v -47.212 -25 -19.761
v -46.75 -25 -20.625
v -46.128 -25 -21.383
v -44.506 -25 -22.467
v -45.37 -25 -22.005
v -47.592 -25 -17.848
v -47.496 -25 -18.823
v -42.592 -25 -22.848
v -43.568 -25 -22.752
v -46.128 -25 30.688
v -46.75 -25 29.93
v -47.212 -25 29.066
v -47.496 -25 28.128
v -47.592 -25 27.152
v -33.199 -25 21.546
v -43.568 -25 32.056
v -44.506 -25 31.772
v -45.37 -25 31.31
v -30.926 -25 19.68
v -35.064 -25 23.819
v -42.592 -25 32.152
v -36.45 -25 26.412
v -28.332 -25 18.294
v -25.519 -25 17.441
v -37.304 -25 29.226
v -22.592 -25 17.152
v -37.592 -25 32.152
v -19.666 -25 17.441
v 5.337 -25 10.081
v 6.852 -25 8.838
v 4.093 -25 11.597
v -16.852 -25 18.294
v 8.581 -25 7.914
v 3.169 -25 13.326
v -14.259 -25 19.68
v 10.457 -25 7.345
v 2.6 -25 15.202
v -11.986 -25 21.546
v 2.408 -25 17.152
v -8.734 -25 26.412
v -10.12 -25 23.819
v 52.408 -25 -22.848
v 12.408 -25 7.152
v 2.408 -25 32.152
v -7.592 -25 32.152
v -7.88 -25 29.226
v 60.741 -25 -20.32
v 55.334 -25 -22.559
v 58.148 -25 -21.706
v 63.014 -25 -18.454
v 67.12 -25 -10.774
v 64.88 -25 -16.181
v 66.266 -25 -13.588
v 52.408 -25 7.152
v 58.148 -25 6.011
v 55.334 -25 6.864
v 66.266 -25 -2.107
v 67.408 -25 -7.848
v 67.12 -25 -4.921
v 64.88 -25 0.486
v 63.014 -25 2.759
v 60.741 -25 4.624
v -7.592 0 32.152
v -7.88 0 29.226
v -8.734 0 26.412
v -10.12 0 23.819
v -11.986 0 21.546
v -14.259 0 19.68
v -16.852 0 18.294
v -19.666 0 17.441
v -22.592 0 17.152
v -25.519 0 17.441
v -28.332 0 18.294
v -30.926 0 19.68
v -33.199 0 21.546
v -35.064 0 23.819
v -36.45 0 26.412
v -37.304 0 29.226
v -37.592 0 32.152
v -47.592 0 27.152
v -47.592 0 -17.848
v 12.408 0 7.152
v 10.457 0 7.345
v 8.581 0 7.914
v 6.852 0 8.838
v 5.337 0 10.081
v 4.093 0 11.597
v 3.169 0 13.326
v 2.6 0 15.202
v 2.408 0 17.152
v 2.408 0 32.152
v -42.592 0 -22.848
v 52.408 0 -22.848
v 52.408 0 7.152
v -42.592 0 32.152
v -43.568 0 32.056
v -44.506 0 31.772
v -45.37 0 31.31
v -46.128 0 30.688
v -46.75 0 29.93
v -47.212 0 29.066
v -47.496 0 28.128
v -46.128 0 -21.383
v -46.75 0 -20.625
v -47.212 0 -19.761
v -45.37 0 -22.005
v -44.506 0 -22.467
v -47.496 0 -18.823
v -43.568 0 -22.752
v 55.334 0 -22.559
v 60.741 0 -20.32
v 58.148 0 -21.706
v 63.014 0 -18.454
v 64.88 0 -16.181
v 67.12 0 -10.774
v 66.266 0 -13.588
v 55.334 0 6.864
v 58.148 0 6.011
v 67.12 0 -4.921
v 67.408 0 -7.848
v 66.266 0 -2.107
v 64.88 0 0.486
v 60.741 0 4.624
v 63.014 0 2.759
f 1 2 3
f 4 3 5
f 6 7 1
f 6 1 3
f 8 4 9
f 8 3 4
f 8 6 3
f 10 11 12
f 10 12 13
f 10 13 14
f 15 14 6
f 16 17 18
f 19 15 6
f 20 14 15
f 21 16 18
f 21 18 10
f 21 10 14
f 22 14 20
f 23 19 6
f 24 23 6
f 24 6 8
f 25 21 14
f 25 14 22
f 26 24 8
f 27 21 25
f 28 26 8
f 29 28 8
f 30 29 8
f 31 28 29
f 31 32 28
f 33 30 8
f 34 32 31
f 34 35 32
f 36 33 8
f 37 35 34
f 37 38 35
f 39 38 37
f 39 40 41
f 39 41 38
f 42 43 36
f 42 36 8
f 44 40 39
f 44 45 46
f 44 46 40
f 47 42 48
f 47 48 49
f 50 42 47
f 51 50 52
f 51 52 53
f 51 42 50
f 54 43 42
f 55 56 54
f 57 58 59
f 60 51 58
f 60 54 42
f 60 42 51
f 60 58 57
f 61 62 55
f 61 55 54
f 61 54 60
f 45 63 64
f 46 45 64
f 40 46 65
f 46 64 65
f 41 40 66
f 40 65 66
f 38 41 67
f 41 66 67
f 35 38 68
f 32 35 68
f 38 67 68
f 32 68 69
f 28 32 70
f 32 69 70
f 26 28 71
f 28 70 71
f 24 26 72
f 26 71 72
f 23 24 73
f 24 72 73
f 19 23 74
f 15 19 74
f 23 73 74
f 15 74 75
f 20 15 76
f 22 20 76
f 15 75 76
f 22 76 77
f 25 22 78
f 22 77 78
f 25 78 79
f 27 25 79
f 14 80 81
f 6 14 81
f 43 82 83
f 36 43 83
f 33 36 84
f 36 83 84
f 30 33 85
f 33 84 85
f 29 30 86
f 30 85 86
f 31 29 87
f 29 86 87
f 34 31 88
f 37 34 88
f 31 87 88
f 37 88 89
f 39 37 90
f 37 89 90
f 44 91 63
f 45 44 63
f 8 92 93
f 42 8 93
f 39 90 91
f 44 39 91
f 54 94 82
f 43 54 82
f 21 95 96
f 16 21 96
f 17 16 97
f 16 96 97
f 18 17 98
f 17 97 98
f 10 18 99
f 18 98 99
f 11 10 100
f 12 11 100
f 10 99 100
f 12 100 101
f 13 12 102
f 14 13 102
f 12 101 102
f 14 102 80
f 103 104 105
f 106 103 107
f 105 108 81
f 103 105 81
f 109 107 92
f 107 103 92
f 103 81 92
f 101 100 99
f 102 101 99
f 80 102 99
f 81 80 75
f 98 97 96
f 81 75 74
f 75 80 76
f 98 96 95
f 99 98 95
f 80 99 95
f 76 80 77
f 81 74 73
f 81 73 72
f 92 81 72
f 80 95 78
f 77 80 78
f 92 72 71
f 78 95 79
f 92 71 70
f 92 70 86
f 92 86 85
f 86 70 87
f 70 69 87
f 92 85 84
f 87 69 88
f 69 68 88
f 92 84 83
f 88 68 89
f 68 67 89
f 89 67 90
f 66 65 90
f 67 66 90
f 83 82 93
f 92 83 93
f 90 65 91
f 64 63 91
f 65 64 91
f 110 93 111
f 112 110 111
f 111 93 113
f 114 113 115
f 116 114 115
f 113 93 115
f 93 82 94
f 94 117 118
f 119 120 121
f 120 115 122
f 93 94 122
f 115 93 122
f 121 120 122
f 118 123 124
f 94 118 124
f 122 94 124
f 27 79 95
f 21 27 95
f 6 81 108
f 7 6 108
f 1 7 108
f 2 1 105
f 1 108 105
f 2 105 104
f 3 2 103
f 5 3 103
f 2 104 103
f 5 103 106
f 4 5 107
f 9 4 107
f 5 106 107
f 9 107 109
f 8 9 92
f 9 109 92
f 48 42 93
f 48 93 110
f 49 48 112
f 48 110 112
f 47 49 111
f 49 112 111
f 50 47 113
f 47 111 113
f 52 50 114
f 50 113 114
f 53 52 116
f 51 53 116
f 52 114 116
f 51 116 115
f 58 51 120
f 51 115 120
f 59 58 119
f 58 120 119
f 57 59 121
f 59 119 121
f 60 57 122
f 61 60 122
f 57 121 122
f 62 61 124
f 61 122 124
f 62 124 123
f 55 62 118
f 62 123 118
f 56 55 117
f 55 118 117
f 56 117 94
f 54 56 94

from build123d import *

# Parameters (mm, degrees)
F1_DEPTH = 25


with BuildPart() as f1:
    # F0 (on Front) → F1 (new body)
    with BuildSketch(Plane.XZ):
        with BuildLine():
            ThreePointArc((-42.592177, 32.152407), (-46.127711, 30.687941), (-47.592177, 27.152407))
            Line((-47.592177, 27.152407), (-47.592177, -17.847593))
            ThreePointArc((-47.592177, -17.847593), (-46.127711, -21.383127), (-42.592177, -22.847593))
            Line((-42.592177, -22.847593), (52.407823, -22.847593))
            ThreePointArc((52.407823, -22.847593), (67.407823, -7.847593), (52.407823, 7.152407))
            Line((52.407823, 7.152407), (12.407823, 7.152407))
            ThreePointArc((12.407823, 7.152407), (5.336755, 10.081339), (2.407823, 17.152407))
            Line((2.407823, 17.152407), (2.407823, 32.152407))
            Line((2.407823, 32.152407), (-7.592177, 32.152407))
            ThreePointArc((-7.592177, 32.152407), (-22.592177, 17.152407), (-37.592177, 32.152407))
            Line((-37.592177, 32.152407), (-42.592177, 32.152407))
        make_face()
    extrude(amount=F1_DEPTH)


solid = f1.part
